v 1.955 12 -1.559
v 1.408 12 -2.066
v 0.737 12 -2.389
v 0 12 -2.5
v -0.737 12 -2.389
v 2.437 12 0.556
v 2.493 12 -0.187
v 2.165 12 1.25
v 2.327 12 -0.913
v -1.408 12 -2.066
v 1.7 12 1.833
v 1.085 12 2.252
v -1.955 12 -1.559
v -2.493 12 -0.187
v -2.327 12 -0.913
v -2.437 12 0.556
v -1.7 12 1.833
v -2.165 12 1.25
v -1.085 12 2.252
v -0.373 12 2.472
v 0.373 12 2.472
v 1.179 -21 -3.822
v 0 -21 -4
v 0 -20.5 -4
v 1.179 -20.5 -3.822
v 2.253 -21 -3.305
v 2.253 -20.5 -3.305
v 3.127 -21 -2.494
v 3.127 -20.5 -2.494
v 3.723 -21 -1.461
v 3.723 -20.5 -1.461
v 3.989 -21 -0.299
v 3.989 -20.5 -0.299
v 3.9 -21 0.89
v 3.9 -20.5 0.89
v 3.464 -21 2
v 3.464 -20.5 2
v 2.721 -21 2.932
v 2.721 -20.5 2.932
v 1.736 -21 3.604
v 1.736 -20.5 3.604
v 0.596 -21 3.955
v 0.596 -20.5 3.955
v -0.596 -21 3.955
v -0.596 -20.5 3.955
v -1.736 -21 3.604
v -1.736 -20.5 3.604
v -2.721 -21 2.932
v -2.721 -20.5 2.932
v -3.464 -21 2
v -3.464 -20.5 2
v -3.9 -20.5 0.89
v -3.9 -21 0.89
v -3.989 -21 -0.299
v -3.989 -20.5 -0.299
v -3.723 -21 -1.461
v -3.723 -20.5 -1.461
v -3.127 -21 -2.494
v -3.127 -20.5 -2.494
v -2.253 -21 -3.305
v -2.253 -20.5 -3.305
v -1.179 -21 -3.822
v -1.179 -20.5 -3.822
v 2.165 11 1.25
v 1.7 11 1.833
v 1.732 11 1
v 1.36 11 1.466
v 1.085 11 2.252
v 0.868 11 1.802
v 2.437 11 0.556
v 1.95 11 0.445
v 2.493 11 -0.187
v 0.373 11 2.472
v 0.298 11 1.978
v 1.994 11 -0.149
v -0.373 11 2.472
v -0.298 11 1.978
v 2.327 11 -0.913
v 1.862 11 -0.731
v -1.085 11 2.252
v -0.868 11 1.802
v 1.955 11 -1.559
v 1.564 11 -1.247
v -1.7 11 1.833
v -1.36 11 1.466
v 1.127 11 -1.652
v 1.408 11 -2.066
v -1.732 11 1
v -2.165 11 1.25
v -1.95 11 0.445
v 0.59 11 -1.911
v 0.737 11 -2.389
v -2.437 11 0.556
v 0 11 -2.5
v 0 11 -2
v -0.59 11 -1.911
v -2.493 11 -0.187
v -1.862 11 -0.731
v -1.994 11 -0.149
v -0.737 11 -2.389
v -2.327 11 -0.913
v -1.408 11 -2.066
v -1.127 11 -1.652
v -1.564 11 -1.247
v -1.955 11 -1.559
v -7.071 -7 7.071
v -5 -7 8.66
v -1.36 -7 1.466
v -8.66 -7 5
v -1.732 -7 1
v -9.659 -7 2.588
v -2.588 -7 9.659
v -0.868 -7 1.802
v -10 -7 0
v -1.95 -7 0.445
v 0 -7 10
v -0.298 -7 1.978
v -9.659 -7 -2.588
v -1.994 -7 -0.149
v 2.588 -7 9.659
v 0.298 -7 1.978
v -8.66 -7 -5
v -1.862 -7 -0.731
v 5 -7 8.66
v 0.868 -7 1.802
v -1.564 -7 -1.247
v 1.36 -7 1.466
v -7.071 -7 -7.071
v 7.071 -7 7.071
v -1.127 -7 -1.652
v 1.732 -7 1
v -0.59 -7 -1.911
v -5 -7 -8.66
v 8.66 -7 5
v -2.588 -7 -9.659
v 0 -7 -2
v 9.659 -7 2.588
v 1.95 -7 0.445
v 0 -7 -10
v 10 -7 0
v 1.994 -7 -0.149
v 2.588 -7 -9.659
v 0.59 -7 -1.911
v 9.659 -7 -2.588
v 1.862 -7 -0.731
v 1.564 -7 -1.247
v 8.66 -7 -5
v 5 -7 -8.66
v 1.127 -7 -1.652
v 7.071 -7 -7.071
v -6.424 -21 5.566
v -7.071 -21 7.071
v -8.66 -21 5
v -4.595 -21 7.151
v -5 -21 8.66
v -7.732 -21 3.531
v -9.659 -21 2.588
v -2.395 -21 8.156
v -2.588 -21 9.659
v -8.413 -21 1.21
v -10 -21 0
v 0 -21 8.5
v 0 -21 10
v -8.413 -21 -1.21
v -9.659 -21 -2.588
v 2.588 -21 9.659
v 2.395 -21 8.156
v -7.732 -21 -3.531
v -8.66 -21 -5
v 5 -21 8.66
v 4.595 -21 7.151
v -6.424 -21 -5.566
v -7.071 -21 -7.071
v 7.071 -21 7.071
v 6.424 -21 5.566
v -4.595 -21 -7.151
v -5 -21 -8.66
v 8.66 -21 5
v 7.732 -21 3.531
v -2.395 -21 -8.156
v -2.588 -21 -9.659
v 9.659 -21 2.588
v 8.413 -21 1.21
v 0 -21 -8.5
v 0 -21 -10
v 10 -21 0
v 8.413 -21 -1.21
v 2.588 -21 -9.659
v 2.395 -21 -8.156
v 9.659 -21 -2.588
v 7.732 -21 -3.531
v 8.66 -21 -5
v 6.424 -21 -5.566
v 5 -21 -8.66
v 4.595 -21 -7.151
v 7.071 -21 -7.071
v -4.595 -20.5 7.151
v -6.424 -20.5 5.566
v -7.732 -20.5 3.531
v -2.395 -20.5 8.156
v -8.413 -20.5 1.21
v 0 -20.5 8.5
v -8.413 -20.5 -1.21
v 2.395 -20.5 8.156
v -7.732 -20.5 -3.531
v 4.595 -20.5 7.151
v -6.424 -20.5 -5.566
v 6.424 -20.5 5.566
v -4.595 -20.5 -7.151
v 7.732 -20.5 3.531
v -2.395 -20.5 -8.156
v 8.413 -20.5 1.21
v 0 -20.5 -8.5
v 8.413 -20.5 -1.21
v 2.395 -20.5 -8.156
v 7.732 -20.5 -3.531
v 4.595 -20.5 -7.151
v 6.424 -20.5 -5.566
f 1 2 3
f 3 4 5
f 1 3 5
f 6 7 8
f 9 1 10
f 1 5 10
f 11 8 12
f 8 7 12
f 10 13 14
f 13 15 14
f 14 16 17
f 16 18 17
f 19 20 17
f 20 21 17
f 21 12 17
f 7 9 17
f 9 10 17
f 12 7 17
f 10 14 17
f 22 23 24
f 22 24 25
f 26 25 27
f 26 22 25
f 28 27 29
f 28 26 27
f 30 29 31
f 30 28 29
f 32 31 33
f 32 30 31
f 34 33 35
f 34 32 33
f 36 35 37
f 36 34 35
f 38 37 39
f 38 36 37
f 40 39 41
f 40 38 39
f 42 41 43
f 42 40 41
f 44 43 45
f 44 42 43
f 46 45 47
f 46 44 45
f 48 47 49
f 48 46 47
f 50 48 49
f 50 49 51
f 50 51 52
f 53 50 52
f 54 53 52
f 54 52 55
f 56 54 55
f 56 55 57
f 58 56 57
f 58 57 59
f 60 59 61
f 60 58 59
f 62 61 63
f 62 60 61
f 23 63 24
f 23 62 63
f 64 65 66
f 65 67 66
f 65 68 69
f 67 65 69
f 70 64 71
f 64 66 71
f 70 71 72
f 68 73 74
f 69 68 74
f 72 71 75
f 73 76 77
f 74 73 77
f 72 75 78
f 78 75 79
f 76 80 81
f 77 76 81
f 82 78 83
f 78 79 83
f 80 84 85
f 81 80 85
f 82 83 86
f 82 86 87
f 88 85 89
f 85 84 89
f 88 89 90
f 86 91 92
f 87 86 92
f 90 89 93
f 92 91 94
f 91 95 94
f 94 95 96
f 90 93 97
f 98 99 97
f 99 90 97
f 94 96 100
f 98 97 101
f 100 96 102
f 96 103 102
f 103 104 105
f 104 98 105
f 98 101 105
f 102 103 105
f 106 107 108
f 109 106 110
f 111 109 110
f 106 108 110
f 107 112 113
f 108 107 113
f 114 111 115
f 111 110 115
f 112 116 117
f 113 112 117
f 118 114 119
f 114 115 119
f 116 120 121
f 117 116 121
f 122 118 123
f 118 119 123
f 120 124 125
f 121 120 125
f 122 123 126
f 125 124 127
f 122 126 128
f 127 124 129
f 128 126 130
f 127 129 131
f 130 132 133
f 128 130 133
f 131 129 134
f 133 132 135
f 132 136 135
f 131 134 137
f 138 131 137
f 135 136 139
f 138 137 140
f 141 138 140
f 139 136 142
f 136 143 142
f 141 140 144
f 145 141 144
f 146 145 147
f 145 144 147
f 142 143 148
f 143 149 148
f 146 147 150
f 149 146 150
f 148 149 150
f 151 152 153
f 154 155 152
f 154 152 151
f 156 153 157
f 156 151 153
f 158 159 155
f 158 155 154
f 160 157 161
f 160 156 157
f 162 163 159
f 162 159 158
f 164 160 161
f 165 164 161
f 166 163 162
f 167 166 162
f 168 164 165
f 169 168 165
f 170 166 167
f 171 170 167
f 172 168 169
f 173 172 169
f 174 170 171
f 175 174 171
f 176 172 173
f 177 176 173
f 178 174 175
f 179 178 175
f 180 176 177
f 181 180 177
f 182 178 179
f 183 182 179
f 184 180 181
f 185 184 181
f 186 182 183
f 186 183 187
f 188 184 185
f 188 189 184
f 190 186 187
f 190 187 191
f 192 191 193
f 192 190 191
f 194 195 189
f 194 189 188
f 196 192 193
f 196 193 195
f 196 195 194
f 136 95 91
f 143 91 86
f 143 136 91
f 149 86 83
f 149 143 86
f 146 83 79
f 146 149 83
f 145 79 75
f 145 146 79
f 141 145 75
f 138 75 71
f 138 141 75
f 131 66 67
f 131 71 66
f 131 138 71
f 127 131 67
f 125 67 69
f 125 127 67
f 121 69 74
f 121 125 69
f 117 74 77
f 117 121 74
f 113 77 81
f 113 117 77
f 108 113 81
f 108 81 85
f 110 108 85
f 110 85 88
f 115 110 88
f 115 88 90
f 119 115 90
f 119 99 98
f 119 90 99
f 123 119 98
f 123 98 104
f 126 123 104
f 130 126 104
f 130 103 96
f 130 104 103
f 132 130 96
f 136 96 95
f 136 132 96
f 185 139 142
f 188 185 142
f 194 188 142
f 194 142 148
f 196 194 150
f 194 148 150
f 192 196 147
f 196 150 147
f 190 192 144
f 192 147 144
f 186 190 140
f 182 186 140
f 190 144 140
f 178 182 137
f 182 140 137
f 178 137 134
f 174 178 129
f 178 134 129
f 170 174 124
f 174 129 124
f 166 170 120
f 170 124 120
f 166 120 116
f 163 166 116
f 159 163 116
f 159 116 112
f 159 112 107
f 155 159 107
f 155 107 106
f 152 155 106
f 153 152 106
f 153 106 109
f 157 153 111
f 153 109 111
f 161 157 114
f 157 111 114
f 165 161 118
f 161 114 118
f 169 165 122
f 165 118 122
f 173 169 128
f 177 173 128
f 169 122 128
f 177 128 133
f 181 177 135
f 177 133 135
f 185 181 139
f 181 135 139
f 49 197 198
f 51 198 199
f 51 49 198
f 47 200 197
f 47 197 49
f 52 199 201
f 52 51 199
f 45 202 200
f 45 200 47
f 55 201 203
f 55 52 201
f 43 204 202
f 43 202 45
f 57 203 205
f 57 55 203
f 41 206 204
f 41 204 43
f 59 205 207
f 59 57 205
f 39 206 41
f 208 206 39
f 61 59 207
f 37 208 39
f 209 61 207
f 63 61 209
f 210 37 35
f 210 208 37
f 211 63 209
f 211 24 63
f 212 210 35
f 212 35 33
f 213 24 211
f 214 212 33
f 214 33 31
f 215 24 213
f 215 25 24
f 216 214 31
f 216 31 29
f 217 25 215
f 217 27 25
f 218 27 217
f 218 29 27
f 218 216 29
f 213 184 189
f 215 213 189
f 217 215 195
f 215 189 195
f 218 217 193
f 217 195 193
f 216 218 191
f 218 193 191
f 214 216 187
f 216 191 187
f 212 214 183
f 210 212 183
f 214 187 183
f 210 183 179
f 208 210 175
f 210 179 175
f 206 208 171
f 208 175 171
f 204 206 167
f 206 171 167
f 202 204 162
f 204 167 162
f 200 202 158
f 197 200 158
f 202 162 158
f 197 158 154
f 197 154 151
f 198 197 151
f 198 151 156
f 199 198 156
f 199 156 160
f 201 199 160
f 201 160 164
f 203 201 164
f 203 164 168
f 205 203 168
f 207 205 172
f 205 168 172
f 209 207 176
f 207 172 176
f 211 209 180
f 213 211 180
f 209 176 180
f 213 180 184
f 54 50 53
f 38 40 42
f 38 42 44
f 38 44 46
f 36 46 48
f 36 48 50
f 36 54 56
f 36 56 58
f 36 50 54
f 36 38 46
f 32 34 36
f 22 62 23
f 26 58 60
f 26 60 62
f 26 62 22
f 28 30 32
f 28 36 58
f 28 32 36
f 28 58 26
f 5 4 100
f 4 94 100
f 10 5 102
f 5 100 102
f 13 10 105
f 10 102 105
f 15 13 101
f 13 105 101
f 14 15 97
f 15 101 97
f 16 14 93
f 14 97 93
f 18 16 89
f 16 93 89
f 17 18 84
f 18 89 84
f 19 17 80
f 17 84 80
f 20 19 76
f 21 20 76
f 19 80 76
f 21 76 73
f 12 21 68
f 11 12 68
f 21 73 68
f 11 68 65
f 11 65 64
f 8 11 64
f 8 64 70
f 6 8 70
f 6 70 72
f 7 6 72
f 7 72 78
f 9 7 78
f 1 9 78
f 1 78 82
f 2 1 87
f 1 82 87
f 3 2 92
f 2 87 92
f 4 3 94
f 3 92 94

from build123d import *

# Parameters (mm, degrees)
BOSS_EXTRUDE1_START = 7
SKETCH2_R           = 2
BOSS_EXTRUDE1_DEPTH = 18
SKETCH3_R           = 10
BOSS_EXTRUDE2_DEPTH = 14
SKETCH4_R           = 8.5
SKETCH4_R_2         = 4
CUT_EXTRUDE1_DEPTH  = 0.5


with BuildPart() as part:
    # Sketch1 → Revolve1 (revolve)
    with BuildSketch(Plane.XY, mode=Mode.PRIVATE) as revolve1_sk:
        Polygon((0, 12), (2.5, 12), (2.5, 11), (2, 11), (2, 0), (0, 0), align=None)
    revolve(revolve1_sk.sketch.rotate(Axis((0, 0, 0), (0, 1, 0)), 90), axis=Axis((0, 0, 0), (0, 1, 0)))

    # Sketch2 → Boss-Extrude1 (add)
    with BuildSketch(Plane.XZ.offset(BOSS_EXTRUDE1_START)):
        with Locations(Location((0, 0, 0), (0, 0, 270))):
            Circle(SKETCH2_R)
    extrude(amount=-BOSS_EXTRUDE1_DEPTH)

    # Sketch3 → Boss-Extrude2 (add)
    with BuildSketch(Plane.XZ.offset(7)):
        with Locations(Location((0, 0, 0), (0, 0, 270))):
            Circle(SKETCH3_R)
    extrude(amount=BOSS_EXTRUDE2_DEPTH)

    # Sketch4 → Cut-Extrude1 (cut)
    with BuildSketch(Plane.XZ.offset(21)):
        with Locations(Location((0, 0, 0), (0, 0, 270))):
            Circle(SKETCH4_R)
        with Locations(Location((0, 0, 0), (0, 0, 270))):
            Circle(SKETCH4_R_2, mode=Mode.SUBTRACT)
    extrude(amount=-CUT_EXTRUDE1_DEPTH, mode=Mode.SUBTRACT)


solid = part.part
